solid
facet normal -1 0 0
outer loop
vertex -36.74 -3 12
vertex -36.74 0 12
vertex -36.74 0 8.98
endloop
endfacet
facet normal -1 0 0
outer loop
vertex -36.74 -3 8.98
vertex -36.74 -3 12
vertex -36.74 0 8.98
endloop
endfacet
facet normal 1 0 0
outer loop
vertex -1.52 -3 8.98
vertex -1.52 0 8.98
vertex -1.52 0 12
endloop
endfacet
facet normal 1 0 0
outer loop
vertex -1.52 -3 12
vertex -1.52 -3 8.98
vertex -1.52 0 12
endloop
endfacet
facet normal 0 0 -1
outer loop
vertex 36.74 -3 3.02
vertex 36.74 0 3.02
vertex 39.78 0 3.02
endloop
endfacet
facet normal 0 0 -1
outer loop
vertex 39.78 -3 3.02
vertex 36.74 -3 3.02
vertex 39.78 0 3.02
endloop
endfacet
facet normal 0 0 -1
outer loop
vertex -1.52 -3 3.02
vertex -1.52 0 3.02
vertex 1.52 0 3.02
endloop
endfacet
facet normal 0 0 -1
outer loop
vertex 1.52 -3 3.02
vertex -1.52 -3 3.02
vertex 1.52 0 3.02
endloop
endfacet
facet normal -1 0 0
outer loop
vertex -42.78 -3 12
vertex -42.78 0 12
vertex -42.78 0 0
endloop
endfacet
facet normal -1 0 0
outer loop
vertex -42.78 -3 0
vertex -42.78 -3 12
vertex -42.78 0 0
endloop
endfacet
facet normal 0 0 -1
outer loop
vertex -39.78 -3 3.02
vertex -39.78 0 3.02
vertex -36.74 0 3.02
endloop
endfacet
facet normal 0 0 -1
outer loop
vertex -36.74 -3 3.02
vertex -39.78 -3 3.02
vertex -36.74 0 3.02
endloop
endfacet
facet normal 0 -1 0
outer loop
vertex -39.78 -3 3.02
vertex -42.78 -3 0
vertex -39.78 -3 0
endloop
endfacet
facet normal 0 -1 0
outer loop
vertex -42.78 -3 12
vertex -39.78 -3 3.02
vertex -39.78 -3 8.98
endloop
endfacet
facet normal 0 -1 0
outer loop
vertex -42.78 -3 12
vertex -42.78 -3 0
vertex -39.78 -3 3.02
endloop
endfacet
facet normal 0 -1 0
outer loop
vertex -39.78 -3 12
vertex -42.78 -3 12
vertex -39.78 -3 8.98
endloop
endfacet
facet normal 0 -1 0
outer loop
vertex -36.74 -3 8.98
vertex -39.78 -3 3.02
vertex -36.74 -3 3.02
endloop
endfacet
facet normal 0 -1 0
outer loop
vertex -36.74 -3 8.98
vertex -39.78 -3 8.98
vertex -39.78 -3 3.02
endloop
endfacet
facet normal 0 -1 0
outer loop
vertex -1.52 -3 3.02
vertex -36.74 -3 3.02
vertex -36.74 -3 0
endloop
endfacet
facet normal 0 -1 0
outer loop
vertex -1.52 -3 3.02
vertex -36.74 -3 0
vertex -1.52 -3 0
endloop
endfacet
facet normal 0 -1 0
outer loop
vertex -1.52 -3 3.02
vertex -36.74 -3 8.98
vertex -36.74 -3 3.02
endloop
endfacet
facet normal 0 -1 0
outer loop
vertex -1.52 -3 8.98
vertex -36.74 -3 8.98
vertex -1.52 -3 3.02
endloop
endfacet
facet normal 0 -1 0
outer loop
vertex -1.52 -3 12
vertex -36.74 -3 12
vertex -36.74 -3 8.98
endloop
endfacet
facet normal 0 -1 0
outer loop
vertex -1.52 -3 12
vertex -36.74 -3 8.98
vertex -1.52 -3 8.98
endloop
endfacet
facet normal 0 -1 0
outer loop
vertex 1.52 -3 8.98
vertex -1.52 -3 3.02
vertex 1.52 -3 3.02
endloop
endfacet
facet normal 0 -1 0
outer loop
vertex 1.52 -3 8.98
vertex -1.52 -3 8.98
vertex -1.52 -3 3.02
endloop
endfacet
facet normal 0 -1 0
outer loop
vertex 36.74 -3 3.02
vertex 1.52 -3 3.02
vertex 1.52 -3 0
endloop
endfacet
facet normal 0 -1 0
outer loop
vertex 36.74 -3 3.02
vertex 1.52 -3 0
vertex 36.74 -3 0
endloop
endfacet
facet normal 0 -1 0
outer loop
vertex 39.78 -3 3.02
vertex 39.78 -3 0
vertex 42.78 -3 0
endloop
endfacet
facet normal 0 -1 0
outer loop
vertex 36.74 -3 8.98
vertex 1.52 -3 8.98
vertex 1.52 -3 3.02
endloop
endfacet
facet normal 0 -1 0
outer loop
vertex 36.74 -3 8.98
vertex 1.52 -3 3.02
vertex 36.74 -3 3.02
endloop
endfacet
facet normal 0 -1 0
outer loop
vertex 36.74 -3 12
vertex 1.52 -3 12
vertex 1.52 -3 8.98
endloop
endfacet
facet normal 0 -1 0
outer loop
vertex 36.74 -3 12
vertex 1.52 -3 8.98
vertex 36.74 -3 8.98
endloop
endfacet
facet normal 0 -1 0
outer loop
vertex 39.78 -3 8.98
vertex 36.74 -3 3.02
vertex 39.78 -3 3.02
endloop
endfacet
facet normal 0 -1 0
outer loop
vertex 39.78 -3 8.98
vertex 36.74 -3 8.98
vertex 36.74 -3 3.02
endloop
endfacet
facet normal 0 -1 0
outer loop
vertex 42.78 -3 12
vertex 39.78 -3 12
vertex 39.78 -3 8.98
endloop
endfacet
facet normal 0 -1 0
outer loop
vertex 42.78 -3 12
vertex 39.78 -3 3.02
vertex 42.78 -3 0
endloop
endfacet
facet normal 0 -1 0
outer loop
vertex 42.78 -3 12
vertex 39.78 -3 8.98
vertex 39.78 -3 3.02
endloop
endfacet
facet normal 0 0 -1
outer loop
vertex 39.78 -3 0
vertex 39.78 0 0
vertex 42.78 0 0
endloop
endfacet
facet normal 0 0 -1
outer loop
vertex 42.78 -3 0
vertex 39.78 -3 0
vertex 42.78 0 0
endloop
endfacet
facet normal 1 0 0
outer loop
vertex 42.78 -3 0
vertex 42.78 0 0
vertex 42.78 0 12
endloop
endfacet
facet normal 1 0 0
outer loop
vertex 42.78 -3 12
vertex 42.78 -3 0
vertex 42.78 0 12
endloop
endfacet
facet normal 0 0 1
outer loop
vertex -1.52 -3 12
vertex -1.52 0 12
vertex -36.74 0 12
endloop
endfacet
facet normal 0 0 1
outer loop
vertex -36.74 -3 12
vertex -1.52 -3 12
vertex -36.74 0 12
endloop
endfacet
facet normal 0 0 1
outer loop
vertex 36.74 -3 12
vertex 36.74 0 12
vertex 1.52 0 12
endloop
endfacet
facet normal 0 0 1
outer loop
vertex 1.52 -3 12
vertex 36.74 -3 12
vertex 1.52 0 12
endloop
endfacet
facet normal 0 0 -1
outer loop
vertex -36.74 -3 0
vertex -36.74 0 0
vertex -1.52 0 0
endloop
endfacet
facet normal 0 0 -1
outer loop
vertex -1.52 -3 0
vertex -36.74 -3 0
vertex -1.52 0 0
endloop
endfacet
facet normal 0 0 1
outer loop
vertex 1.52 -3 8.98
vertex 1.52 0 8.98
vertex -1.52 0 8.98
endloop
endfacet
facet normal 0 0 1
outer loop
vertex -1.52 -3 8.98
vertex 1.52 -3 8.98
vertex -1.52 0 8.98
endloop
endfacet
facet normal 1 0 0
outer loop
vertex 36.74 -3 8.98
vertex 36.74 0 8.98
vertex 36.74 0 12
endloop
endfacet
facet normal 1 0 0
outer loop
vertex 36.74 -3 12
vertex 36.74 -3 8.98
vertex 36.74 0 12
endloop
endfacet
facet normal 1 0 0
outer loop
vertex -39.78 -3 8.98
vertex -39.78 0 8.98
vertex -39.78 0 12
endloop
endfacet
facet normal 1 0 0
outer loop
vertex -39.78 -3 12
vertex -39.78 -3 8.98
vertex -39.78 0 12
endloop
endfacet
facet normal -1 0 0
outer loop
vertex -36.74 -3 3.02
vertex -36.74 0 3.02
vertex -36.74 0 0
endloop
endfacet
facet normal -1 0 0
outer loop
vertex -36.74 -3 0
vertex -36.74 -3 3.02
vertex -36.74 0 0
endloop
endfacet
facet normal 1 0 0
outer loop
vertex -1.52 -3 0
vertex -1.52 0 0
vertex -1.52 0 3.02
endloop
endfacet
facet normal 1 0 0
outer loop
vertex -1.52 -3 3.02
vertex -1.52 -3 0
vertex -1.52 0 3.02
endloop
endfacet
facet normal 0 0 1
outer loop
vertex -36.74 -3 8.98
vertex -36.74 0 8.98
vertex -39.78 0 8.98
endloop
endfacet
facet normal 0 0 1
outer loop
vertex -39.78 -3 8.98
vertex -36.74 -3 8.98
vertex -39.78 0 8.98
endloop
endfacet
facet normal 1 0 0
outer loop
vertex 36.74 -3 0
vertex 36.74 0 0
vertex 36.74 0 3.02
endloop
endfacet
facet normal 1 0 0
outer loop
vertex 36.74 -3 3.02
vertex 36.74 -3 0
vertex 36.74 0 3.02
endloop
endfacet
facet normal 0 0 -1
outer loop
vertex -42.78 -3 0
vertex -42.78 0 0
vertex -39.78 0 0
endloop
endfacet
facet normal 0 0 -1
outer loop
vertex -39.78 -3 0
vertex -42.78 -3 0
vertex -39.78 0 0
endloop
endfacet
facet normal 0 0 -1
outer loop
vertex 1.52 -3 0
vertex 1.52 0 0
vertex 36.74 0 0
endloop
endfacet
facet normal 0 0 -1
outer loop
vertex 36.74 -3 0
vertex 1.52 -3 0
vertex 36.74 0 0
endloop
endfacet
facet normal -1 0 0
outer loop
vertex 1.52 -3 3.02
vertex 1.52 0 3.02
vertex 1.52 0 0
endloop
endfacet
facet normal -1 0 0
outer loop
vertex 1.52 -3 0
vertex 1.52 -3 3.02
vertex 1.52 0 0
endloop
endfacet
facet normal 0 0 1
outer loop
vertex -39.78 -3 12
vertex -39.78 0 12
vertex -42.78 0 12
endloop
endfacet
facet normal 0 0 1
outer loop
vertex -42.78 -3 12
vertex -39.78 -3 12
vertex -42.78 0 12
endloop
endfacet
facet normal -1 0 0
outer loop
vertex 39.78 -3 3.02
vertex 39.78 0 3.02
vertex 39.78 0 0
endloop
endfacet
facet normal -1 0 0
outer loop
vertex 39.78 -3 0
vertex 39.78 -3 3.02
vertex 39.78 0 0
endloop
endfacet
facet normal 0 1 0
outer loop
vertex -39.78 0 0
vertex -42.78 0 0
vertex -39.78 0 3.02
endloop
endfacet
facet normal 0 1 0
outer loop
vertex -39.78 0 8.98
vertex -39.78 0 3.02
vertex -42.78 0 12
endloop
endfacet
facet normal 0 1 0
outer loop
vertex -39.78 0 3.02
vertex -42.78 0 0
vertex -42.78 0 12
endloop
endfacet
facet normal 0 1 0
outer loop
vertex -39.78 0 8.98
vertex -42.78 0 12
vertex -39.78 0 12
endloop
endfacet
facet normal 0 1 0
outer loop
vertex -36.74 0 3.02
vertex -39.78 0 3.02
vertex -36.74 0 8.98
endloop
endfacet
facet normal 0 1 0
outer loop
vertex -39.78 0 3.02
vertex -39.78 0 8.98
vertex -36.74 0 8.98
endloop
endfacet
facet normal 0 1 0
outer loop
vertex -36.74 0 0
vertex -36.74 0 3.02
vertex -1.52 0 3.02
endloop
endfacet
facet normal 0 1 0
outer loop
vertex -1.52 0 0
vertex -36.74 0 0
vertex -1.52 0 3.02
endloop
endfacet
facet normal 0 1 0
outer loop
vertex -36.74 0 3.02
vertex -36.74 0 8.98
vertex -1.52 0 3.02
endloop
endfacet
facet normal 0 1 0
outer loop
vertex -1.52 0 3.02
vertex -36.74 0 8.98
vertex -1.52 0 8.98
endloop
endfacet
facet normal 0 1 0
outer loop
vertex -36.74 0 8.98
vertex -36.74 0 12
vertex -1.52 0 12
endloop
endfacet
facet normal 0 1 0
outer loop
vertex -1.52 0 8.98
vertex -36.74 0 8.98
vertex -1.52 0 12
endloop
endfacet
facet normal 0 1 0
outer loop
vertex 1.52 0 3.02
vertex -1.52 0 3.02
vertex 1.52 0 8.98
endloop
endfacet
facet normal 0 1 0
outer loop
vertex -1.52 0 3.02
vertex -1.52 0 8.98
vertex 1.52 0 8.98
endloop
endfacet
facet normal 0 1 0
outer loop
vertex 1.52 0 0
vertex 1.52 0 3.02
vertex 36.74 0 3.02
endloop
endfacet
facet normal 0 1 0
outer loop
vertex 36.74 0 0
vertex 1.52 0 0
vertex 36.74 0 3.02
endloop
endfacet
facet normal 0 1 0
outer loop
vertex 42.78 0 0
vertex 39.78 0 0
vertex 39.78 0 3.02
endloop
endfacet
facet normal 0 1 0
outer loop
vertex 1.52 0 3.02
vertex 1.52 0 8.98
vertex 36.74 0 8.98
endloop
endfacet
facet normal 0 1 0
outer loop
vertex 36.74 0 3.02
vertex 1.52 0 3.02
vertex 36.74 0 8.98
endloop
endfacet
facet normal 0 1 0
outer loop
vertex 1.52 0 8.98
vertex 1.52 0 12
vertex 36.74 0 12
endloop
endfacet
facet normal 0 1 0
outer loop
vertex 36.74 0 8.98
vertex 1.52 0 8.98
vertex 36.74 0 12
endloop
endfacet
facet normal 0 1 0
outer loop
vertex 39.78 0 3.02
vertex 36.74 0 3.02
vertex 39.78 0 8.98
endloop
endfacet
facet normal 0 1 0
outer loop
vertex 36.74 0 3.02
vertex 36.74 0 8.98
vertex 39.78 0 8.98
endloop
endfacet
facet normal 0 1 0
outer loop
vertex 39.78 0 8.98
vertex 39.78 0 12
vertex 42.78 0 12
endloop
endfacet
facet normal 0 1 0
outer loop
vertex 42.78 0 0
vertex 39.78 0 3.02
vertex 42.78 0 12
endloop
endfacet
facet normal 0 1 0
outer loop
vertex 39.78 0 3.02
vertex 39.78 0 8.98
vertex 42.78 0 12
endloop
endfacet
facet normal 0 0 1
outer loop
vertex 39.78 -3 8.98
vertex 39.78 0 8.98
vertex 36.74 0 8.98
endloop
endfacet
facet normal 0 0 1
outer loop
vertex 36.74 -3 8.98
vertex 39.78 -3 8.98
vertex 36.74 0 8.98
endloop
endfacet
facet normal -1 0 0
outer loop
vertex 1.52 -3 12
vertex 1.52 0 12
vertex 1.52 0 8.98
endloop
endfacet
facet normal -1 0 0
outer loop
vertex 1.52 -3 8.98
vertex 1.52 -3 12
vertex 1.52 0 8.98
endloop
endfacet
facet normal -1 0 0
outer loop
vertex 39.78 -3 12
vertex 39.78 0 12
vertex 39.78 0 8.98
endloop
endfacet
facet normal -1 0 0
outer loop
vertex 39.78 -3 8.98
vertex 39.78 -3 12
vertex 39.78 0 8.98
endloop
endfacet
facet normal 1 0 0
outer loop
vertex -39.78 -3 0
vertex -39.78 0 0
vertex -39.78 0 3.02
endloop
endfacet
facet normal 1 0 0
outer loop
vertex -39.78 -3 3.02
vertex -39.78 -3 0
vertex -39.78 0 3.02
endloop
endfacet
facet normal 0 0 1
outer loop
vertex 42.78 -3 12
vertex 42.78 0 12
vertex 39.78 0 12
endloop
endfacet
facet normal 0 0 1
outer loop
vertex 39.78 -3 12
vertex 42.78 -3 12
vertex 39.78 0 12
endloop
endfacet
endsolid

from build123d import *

# Parameters (mm, degrees)
F1_DEPTH = 3


with BuildPart() as f1:
    # F0 (on Front) → F1 (new body)
    with BuildSketch(Plane.XZ):
        Polygon((-42.78, 0), (-39.78, 0), (-39.78, 3.02), (-36.74, 3.02), (-36.74, 0), (-1.52, 0), (-1.52, 3.02), (1.52, 3.02), (1.52, 0), (36.74, 0), (36.74, 3.02), (39.78, 3.02), (39.78, 0), (42.78, 0), (42.78, 12), (39.78, 12), (39.78, 8.98), (36.74, 8.98), (36.74, 12), (1.52, 12), (1.52, 8.98), (-1.52, 8.98), (-1.52, 12), (-36.74, 12), (-36.74, 8.98), (-39.78, 8.98), (-39.78, 12), (-42.78, 12), align=None)
    extrude(amount=F1_DEPTH)


solid = f1.part
